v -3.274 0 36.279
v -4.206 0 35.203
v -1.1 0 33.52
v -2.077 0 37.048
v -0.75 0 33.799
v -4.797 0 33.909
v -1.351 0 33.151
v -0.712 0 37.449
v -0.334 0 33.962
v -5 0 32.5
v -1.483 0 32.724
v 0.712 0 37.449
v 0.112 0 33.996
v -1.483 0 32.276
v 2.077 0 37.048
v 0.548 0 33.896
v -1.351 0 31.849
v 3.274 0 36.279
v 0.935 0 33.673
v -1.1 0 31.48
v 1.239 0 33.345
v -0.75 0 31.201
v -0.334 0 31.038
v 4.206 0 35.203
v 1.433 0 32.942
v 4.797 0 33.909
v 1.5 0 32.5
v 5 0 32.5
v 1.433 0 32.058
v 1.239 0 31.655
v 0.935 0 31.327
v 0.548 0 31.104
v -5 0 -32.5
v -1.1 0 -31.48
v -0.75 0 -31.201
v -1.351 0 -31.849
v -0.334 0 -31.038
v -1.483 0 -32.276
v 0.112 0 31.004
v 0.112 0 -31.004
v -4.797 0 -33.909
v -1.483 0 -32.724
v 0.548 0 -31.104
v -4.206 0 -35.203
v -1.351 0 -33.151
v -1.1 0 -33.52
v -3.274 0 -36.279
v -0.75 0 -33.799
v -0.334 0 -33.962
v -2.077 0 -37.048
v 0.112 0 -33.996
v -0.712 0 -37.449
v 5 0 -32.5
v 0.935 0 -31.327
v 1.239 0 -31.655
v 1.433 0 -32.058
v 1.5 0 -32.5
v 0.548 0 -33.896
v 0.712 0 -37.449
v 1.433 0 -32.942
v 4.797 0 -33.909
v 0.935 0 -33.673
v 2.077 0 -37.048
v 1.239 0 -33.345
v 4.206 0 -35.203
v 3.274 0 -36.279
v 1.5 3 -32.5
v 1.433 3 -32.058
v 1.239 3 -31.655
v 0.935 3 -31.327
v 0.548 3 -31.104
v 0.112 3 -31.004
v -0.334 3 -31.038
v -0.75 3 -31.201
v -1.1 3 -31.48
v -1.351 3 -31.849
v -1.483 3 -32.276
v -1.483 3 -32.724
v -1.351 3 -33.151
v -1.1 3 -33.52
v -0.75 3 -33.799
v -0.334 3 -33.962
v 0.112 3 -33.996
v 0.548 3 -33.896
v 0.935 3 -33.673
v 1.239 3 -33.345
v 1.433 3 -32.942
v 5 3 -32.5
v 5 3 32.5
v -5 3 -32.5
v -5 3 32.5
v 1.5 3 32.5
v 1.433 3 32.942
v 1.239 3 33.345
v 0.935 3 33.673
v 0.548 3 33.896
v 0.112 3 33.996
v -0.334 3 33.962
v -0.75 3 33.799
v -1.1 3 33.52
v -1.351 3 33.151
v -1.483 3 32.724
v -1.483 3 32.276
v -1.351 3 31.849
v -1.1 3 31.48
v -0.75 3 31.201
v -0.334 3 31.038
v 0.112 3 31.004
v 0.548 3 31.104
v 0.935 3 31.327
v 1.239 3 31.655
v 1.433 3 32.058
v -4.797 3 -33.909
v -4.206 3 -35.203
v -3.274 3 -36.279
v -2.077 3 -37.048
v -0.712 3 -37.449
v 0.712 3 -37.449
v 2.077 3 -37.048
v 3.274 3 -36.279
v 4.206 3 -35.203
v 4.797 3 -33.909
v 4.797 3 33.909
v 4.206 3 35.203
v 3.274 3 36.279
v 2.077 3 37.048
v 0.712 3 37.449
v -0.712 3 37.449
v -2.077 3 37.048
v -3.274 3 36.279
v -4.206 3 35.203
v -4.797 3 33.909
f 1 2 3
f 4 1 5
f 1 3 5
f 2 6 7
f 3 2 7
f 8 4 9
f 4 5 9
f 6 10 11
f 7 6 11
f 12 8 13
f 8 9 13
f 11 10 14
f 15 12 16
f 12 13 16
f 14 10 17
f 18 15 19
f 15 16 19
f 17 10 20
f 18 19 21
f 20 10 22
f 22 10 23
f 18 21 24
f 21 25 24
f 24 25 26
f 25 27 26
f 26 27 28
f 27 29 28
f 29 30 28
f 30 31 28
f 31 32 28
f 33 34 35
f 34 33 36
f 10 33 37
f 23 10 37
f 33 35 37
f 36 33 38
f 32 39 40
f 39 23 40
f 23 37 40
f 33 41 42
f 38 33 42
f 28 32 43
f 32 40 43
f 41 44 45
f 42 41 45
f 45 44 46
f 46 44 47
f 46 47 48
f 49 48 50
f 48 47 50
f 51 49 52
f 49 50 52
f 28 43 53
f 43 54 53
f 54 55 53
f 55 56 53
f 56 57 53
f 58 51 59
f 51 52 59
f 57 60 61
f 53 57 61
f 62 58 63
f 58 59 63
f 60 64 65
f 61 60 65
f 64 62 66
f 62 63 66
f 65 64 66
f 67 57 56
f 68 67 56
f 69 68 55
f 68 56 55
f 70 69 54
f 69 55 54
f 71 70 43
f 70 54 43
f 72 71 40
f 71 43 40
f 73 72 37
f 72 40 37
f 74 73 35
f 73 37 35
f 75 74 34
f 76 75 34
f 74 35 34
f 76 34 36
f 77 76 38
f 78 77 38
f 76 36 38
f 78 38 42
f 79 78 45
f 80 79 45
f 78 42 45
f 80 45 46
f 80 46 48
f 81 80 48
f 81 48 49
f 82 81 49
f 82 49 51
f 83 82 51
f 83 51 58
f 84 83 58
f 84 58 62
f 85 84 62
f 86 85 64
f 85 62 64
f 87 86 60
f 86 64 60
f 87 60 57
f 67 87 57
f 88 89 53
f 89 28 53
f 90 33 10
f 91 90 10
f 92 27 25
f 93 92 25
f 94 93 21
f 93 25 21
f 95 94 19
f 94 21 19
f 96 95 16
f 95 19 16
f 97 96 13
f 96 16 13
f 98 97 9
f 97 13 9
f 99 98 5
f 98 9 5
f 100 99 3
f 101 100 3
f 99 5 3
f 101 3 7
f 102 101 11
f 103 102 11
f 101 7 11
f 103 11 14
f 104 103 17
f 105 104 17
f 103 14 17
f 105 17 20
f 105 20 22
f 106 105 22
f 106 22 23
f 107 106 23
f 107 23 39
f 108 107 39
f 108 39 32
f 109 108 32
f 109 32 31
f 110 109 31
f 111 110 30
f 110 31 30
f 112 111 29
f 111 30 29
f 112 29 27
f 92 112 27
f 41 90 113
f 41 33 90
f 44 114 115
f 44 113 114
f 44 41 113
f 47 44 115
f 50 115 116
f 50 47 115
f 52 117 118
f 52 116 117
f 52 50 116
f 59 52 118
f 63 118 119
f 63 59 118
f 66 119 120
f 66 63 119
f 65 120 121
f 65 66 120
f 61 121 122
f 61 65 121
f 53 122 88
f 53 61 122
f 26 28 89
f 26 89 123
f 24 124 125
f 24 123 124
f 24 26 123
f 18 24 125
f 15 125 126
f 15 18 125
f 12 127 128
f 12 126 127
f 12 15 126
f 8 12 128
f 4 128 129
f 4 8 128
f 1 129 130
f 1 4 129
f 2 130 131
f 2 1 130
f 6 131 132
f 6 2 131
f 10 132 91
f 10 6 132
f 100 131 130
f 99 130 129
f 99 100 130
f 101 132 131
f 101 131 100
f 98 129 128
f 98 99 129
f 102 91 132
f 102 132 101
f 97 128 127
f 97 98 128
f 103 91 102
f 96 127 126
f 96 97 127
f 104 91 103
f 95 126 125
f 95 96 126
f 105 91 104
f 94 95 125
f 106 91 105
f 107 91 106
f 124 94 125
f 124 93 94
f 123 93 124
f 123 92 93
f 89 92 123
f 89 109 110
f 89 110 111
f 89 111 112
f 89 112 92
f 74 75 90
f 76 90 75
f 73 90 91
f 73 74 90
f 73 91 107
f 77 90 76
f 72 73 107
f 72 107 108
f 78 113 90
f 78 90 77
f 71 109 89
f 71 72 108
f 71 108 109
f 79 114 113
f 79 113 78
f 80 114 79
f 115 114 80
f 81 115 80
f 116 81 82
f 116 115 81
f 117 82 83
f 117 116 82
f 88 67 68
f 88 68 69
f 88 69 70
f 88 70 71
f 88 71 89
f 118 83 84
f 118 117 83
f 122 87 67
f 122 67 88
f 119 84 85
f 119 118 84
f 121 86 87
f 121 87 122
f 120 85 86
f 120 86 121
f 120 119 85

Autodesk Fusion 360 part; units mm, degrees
sketch "Sketch1" plane through (0, 0, 0) normal (0, 1, 0) x (1, 0, 0)
  line L0 (5, 32.5) -> (-5, 32.5)
  line L1 (-5, 32.5) -> (-5, -32.5)
  line L2 (-5, -32.5) -> (5, -32.5)
  line L3 (5, -32.5) -> (5, 32.5)
  line L4 (5, 32.5) -> (-5, -32.5) construction
  line L5 (-5, 32.5) -> (5, -32.5) construction
  arc A0 (5, 32.5) -> (-5, 32.5) centre (0, 32.5) ccw
  line L6 (-5, 0) -> (5, 0) construction
  circle A1 centre (0, 32.5) radius 1.5
  arc A2 (-5, -32.5) -> (5, -32.5) centre (0, -32.5) ccw
  circle A3 centre (0, -32.5) radius 1.5
  dimension "d1" = 10
  dimension "d2" = 65
  dimension "d3" = 3
extrude "Extrude1" add sketch "Sketch1" along normal blind 3 contours L0 L1 L2 L3 A1 A3 | L0 A0 A1 | L2 A2 A3
